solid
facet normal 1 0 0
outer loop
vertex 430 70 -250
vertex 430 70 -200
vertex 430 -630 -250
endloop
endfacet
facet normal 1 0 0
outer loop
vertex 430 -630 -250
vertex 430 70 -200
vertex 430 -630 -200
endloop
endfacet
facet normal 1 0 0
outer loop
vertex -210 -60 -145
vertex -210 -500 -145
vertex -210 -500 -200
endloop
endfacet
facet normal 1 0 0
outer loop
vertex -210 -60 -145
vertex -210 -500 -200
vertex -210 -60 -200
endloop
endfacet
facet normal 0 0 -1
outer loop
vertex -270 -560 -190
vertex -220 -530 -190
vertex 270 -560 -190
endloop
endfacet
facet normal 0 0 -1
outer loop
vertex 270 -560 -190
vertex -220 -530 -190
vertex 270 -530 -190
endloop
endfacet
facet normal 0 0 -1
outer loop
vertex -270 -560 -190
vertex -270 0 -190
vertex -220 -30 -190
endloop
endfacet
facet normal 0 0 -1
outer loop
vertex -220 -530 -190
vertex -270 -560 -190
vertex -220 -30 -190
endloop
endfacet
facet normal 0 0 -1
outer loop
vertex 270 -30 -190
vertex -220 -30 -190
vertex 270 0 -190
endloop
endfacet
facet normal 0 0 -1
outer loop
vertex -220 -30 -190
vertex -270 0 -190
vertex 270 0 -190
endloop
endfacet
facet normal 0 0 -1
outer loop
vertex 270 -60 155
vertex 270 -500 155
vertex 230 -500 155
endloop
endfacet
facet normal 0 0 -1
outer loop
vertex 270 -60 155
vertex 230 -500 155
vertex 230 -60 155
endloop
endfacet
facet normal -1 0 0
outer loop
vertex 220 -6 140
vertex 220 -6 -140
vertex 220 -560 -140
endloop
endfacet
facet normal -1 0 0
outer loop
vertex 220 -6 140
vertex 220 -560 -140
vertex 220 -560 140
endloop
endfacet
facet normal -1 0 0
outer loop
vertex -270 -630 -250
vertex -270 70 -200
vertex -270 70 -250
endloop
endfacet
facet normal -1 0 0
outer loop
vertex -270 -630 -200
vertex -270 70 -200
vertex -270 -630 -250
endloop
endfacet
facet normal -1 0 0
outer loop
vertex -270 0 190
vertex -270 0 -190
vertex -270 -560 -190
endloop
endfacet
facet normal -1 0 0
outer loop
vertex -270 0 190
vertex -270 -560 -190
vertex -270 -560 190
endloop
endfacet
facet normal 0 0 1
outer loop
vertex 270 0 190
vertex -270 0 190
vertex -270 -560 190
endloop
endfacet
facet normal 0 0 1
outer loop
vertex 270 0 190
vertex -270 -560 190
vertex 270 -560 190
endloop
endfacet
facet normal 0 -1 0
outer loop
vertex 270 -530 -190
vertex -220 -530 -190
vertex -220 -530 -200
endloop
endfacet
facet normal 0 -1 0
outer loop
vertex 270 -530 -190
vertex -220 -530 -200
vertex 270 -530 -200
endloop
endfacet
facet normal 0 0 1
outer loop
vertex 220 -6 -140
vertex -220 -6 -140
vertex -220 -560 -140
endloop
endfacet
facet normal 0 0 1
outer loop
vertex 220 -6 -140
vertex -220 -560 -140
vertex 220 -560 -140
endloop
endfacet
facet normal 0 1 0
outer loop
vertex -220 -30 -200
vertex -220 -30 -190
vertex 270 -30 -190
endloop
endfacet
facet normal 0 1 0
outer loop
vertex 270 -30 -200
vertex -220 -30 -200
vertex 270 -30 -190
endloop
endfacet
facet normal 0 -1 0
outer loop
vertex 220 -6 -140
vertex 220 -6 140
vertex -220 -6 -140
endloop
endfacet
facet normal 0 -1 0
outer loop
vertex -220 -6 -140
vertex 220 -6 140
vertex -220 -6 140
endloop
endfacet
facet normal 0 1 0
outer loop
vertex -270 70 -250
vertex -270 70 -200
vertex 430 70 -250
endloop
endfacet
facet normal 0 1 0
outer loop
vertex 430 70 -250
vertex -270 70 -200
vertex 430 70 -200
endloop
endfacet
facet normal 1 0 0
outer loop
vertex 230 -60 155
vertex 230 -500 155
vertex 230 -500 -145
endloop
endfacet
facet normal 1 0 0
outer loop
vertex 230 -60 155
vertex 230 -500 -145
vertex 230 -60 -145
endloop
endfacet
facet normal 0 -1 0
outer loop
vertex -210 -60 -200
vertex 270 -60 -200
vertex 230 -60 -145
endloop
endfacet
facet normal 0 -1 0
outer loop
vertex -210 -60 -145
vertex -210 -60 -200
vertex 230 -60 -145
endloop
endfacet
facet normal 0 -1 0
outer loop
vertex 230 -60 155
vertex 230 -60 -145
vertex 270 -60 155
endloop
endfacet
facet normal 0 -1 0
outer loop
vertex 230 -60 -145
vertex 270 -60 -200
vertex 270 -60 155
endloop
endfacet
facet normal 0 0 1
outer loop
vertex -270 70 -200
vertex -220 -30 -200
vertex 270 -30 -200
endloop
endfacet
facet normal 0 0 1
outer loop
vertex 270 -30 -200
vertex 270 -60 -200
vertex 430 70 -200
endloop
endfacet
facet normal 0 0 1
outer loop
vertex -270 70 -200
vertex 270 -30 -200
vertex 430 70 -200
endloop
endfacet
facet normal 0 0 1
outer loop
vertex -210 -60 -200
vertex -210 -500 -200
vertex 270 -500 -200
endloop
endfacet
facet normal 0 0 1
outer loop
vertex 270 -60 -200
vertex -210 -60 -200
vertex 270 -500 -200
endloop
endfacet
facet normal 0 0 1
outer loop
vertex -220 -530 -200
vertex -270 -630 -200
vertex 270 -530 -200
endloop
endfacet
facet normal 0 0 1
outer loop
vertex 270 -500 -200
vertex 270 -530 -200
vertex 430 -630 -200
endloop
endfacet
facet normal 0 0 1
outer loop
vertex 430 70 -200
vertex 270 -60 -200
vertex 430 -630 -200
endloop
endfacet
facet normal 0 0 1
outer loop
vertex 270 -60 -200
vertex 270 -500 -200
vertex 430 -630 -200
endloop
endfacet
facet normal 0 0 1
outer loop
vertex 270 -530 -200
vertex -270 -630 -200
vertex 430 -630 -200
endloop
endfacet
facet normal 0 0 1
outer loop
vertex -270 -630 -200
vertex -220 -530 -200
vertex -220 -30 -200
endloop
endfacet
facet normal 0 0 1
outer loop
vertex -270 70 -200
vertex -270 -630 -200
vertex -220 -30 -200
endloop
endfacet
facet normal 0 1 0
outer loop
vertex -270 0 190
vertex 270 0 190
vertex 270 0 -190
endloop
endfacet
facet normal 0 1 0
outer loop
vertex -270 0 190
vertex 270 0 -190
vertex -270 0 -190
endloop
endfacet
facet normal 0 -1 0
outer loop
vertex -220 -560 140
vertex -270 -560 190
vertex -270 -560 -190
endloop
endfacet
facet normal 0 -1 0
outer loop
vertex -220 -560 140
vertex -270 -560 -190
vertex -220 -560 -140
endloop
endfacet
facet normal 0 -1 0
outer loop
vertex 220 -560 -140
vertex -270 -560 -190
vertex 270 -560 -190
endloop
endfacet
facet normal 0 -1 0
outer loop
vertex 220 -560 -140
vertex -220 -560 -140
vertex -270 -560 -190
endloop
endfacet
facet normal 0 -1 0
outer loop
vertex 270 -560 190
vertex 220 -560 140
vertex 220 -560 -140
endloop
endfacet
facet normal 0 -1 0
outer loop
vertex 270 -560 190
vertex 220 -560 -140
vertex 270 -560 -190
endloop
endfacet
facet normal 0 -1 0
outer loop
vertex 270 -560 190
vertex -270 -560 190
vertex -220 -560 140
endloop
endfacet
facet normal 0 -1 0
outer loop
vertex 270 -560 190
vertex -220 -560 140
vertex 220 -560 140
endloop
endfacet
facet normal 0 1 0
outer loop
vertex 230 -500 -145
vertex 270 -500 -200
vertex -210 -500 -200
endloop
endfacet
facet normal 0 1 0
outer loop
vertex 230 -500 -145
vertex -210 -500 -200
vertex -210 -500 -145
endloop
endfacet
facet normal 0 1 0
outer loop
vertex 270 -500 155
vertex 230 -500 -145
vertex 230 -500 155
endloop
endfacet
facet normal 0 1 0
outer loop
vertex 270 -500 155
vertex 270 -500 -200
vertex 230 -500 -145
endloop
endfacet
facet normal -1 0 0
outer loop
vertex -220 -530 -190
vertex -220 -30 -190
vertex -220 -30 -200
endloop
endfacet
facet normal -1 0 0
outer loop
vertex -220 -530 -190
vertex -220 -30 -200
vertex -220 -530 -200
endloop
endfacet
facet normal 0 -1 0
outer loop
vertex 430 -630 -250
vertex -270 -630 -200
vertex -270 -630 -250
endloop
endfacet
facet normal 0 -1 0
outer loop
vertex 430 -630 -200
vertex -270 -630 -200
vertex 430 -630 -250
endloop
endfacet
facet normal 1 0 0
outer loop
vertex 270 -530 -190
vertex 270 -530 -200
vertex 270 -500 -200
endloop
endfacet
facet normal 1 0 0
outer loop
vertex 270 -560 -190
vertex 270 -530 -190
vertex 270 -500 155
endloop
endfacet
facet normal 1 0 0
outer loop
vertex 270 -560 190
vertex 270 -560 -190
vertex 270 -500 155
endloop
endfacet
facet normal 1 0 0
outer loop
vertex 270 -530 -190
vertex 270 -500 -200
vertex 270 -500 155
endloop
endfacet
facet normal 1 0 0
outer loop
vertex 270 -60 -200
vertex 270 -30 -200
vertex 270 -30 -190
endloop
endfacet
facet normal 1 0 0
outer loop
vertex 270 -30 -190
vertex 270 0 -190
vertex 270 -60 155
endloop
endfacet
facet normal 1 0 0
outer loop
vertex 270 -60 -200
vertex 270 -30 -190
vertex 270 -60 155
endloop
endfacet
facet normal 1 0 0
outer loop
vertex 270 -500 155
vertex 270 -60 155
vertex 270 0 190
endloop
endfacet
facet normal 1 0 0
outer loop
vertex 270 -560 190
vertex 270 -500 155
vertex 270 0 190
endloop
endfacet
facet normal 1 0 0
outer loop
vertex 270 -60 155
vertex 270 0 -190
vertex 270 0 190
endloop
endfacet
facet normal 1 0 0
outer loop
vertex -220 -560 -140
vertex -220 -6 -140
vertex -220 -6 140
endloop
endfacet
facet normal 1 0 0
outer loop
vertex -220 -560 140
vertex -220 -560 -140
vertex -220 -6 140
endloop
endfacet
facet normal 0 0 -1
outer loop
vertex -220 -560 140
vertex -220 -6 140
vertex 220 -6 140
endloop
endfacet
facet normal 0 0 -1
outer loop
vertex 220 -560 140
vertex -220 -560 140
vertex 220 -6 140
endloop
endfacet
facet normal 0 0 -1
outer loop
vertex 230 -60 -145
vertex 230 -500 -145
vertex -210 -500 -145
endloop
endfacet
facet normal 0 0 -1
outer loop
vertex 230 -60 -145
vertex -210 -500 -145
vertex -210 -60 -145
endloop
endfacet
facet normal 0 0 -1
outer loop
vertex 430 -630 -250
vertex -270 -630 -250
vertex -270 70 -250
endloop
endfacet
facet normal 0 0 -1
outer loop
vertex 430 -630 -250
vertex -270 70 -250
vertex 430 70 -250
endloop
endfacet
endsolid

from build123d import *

# Parameters (mm, degrees)
F0_W      = 540
F0_H      = 380
F0_W_2    = 440
F0_H_2    = 280
F1_DEPTH  = 560
F2_W      = 490
F2_H      = 500
F3_DEPTH  = 10
F4_W      = 700
F4_H      = 700
F5_DEPTH  = 50
F6_W      = 440
F6_H      = 280
F7_DEPTH  = 6
F8_W      = 440
F8_H      = 55
F9_DEPTH  = 480
F10_W     = 440
F10_H     = 300
F11_DEPTH = 40


with BuildPart() as f1:
    # F0 (on Front) → F1 (new body)
    with BuildSketch(Plane.XZ):
        Rectangle(F0_W, F0_H)
        Rectangle(F0_W_2, F0_H_2, mode=Mode.SUBTRACT)
    extrude(amount=F1_DEPTH)

    # F2 (on face) → F3 (join)
    with BuildSketch(Plane(origin=(0, 0, -190), x_dir=(1, 0, 0), z_dir=(0, 0, -1))):
        with Locations((25, 280)):
            Rectangle(F2_W, F2_H)
    extrude(amount=F3_DEPTH)

    # F4 (on face) → F5 (join)
    with BuildSketch(Plane(origin=(0, 0, -200), x_dir=(1, 0, 0), z_dir=(0, 0, -1))):
        with Locations((80, 280)):
            Rectangle(F4_W, F4_H)
    extrude(amount=F5_DEPTH)

    # F6 (on face) → F7 (join)
    with BuildSketch(Plane(origin=(0, 0, 0), x_dir=(-1, 0, 0), z_dir=(0, 1, 0))):
        Rectangle(F6_W, F6_H)
    extrude(amount=-F7_DEPTH)

    # F8 (on face) → F9 (cut)
    with BuildSketch(Plane.YZ.offset(270)):
        with Locations((-280, -172.5)):
            Rectangle(F8_W, F8_H)
    extrude(amount=-F9_DEPTH, mode=Mode.SUBTRACT)

    # F10 (on face) → F11 (cut)
    with BuildSketch(Plane.YZ.offset(270)):
        with Locations((-280, 5)):
            Rectangle(F10_W, F10_H)
    extrude(amount=-F11_DEPTH, mode=Mode.SUBTRACT)


solid = f1.part
